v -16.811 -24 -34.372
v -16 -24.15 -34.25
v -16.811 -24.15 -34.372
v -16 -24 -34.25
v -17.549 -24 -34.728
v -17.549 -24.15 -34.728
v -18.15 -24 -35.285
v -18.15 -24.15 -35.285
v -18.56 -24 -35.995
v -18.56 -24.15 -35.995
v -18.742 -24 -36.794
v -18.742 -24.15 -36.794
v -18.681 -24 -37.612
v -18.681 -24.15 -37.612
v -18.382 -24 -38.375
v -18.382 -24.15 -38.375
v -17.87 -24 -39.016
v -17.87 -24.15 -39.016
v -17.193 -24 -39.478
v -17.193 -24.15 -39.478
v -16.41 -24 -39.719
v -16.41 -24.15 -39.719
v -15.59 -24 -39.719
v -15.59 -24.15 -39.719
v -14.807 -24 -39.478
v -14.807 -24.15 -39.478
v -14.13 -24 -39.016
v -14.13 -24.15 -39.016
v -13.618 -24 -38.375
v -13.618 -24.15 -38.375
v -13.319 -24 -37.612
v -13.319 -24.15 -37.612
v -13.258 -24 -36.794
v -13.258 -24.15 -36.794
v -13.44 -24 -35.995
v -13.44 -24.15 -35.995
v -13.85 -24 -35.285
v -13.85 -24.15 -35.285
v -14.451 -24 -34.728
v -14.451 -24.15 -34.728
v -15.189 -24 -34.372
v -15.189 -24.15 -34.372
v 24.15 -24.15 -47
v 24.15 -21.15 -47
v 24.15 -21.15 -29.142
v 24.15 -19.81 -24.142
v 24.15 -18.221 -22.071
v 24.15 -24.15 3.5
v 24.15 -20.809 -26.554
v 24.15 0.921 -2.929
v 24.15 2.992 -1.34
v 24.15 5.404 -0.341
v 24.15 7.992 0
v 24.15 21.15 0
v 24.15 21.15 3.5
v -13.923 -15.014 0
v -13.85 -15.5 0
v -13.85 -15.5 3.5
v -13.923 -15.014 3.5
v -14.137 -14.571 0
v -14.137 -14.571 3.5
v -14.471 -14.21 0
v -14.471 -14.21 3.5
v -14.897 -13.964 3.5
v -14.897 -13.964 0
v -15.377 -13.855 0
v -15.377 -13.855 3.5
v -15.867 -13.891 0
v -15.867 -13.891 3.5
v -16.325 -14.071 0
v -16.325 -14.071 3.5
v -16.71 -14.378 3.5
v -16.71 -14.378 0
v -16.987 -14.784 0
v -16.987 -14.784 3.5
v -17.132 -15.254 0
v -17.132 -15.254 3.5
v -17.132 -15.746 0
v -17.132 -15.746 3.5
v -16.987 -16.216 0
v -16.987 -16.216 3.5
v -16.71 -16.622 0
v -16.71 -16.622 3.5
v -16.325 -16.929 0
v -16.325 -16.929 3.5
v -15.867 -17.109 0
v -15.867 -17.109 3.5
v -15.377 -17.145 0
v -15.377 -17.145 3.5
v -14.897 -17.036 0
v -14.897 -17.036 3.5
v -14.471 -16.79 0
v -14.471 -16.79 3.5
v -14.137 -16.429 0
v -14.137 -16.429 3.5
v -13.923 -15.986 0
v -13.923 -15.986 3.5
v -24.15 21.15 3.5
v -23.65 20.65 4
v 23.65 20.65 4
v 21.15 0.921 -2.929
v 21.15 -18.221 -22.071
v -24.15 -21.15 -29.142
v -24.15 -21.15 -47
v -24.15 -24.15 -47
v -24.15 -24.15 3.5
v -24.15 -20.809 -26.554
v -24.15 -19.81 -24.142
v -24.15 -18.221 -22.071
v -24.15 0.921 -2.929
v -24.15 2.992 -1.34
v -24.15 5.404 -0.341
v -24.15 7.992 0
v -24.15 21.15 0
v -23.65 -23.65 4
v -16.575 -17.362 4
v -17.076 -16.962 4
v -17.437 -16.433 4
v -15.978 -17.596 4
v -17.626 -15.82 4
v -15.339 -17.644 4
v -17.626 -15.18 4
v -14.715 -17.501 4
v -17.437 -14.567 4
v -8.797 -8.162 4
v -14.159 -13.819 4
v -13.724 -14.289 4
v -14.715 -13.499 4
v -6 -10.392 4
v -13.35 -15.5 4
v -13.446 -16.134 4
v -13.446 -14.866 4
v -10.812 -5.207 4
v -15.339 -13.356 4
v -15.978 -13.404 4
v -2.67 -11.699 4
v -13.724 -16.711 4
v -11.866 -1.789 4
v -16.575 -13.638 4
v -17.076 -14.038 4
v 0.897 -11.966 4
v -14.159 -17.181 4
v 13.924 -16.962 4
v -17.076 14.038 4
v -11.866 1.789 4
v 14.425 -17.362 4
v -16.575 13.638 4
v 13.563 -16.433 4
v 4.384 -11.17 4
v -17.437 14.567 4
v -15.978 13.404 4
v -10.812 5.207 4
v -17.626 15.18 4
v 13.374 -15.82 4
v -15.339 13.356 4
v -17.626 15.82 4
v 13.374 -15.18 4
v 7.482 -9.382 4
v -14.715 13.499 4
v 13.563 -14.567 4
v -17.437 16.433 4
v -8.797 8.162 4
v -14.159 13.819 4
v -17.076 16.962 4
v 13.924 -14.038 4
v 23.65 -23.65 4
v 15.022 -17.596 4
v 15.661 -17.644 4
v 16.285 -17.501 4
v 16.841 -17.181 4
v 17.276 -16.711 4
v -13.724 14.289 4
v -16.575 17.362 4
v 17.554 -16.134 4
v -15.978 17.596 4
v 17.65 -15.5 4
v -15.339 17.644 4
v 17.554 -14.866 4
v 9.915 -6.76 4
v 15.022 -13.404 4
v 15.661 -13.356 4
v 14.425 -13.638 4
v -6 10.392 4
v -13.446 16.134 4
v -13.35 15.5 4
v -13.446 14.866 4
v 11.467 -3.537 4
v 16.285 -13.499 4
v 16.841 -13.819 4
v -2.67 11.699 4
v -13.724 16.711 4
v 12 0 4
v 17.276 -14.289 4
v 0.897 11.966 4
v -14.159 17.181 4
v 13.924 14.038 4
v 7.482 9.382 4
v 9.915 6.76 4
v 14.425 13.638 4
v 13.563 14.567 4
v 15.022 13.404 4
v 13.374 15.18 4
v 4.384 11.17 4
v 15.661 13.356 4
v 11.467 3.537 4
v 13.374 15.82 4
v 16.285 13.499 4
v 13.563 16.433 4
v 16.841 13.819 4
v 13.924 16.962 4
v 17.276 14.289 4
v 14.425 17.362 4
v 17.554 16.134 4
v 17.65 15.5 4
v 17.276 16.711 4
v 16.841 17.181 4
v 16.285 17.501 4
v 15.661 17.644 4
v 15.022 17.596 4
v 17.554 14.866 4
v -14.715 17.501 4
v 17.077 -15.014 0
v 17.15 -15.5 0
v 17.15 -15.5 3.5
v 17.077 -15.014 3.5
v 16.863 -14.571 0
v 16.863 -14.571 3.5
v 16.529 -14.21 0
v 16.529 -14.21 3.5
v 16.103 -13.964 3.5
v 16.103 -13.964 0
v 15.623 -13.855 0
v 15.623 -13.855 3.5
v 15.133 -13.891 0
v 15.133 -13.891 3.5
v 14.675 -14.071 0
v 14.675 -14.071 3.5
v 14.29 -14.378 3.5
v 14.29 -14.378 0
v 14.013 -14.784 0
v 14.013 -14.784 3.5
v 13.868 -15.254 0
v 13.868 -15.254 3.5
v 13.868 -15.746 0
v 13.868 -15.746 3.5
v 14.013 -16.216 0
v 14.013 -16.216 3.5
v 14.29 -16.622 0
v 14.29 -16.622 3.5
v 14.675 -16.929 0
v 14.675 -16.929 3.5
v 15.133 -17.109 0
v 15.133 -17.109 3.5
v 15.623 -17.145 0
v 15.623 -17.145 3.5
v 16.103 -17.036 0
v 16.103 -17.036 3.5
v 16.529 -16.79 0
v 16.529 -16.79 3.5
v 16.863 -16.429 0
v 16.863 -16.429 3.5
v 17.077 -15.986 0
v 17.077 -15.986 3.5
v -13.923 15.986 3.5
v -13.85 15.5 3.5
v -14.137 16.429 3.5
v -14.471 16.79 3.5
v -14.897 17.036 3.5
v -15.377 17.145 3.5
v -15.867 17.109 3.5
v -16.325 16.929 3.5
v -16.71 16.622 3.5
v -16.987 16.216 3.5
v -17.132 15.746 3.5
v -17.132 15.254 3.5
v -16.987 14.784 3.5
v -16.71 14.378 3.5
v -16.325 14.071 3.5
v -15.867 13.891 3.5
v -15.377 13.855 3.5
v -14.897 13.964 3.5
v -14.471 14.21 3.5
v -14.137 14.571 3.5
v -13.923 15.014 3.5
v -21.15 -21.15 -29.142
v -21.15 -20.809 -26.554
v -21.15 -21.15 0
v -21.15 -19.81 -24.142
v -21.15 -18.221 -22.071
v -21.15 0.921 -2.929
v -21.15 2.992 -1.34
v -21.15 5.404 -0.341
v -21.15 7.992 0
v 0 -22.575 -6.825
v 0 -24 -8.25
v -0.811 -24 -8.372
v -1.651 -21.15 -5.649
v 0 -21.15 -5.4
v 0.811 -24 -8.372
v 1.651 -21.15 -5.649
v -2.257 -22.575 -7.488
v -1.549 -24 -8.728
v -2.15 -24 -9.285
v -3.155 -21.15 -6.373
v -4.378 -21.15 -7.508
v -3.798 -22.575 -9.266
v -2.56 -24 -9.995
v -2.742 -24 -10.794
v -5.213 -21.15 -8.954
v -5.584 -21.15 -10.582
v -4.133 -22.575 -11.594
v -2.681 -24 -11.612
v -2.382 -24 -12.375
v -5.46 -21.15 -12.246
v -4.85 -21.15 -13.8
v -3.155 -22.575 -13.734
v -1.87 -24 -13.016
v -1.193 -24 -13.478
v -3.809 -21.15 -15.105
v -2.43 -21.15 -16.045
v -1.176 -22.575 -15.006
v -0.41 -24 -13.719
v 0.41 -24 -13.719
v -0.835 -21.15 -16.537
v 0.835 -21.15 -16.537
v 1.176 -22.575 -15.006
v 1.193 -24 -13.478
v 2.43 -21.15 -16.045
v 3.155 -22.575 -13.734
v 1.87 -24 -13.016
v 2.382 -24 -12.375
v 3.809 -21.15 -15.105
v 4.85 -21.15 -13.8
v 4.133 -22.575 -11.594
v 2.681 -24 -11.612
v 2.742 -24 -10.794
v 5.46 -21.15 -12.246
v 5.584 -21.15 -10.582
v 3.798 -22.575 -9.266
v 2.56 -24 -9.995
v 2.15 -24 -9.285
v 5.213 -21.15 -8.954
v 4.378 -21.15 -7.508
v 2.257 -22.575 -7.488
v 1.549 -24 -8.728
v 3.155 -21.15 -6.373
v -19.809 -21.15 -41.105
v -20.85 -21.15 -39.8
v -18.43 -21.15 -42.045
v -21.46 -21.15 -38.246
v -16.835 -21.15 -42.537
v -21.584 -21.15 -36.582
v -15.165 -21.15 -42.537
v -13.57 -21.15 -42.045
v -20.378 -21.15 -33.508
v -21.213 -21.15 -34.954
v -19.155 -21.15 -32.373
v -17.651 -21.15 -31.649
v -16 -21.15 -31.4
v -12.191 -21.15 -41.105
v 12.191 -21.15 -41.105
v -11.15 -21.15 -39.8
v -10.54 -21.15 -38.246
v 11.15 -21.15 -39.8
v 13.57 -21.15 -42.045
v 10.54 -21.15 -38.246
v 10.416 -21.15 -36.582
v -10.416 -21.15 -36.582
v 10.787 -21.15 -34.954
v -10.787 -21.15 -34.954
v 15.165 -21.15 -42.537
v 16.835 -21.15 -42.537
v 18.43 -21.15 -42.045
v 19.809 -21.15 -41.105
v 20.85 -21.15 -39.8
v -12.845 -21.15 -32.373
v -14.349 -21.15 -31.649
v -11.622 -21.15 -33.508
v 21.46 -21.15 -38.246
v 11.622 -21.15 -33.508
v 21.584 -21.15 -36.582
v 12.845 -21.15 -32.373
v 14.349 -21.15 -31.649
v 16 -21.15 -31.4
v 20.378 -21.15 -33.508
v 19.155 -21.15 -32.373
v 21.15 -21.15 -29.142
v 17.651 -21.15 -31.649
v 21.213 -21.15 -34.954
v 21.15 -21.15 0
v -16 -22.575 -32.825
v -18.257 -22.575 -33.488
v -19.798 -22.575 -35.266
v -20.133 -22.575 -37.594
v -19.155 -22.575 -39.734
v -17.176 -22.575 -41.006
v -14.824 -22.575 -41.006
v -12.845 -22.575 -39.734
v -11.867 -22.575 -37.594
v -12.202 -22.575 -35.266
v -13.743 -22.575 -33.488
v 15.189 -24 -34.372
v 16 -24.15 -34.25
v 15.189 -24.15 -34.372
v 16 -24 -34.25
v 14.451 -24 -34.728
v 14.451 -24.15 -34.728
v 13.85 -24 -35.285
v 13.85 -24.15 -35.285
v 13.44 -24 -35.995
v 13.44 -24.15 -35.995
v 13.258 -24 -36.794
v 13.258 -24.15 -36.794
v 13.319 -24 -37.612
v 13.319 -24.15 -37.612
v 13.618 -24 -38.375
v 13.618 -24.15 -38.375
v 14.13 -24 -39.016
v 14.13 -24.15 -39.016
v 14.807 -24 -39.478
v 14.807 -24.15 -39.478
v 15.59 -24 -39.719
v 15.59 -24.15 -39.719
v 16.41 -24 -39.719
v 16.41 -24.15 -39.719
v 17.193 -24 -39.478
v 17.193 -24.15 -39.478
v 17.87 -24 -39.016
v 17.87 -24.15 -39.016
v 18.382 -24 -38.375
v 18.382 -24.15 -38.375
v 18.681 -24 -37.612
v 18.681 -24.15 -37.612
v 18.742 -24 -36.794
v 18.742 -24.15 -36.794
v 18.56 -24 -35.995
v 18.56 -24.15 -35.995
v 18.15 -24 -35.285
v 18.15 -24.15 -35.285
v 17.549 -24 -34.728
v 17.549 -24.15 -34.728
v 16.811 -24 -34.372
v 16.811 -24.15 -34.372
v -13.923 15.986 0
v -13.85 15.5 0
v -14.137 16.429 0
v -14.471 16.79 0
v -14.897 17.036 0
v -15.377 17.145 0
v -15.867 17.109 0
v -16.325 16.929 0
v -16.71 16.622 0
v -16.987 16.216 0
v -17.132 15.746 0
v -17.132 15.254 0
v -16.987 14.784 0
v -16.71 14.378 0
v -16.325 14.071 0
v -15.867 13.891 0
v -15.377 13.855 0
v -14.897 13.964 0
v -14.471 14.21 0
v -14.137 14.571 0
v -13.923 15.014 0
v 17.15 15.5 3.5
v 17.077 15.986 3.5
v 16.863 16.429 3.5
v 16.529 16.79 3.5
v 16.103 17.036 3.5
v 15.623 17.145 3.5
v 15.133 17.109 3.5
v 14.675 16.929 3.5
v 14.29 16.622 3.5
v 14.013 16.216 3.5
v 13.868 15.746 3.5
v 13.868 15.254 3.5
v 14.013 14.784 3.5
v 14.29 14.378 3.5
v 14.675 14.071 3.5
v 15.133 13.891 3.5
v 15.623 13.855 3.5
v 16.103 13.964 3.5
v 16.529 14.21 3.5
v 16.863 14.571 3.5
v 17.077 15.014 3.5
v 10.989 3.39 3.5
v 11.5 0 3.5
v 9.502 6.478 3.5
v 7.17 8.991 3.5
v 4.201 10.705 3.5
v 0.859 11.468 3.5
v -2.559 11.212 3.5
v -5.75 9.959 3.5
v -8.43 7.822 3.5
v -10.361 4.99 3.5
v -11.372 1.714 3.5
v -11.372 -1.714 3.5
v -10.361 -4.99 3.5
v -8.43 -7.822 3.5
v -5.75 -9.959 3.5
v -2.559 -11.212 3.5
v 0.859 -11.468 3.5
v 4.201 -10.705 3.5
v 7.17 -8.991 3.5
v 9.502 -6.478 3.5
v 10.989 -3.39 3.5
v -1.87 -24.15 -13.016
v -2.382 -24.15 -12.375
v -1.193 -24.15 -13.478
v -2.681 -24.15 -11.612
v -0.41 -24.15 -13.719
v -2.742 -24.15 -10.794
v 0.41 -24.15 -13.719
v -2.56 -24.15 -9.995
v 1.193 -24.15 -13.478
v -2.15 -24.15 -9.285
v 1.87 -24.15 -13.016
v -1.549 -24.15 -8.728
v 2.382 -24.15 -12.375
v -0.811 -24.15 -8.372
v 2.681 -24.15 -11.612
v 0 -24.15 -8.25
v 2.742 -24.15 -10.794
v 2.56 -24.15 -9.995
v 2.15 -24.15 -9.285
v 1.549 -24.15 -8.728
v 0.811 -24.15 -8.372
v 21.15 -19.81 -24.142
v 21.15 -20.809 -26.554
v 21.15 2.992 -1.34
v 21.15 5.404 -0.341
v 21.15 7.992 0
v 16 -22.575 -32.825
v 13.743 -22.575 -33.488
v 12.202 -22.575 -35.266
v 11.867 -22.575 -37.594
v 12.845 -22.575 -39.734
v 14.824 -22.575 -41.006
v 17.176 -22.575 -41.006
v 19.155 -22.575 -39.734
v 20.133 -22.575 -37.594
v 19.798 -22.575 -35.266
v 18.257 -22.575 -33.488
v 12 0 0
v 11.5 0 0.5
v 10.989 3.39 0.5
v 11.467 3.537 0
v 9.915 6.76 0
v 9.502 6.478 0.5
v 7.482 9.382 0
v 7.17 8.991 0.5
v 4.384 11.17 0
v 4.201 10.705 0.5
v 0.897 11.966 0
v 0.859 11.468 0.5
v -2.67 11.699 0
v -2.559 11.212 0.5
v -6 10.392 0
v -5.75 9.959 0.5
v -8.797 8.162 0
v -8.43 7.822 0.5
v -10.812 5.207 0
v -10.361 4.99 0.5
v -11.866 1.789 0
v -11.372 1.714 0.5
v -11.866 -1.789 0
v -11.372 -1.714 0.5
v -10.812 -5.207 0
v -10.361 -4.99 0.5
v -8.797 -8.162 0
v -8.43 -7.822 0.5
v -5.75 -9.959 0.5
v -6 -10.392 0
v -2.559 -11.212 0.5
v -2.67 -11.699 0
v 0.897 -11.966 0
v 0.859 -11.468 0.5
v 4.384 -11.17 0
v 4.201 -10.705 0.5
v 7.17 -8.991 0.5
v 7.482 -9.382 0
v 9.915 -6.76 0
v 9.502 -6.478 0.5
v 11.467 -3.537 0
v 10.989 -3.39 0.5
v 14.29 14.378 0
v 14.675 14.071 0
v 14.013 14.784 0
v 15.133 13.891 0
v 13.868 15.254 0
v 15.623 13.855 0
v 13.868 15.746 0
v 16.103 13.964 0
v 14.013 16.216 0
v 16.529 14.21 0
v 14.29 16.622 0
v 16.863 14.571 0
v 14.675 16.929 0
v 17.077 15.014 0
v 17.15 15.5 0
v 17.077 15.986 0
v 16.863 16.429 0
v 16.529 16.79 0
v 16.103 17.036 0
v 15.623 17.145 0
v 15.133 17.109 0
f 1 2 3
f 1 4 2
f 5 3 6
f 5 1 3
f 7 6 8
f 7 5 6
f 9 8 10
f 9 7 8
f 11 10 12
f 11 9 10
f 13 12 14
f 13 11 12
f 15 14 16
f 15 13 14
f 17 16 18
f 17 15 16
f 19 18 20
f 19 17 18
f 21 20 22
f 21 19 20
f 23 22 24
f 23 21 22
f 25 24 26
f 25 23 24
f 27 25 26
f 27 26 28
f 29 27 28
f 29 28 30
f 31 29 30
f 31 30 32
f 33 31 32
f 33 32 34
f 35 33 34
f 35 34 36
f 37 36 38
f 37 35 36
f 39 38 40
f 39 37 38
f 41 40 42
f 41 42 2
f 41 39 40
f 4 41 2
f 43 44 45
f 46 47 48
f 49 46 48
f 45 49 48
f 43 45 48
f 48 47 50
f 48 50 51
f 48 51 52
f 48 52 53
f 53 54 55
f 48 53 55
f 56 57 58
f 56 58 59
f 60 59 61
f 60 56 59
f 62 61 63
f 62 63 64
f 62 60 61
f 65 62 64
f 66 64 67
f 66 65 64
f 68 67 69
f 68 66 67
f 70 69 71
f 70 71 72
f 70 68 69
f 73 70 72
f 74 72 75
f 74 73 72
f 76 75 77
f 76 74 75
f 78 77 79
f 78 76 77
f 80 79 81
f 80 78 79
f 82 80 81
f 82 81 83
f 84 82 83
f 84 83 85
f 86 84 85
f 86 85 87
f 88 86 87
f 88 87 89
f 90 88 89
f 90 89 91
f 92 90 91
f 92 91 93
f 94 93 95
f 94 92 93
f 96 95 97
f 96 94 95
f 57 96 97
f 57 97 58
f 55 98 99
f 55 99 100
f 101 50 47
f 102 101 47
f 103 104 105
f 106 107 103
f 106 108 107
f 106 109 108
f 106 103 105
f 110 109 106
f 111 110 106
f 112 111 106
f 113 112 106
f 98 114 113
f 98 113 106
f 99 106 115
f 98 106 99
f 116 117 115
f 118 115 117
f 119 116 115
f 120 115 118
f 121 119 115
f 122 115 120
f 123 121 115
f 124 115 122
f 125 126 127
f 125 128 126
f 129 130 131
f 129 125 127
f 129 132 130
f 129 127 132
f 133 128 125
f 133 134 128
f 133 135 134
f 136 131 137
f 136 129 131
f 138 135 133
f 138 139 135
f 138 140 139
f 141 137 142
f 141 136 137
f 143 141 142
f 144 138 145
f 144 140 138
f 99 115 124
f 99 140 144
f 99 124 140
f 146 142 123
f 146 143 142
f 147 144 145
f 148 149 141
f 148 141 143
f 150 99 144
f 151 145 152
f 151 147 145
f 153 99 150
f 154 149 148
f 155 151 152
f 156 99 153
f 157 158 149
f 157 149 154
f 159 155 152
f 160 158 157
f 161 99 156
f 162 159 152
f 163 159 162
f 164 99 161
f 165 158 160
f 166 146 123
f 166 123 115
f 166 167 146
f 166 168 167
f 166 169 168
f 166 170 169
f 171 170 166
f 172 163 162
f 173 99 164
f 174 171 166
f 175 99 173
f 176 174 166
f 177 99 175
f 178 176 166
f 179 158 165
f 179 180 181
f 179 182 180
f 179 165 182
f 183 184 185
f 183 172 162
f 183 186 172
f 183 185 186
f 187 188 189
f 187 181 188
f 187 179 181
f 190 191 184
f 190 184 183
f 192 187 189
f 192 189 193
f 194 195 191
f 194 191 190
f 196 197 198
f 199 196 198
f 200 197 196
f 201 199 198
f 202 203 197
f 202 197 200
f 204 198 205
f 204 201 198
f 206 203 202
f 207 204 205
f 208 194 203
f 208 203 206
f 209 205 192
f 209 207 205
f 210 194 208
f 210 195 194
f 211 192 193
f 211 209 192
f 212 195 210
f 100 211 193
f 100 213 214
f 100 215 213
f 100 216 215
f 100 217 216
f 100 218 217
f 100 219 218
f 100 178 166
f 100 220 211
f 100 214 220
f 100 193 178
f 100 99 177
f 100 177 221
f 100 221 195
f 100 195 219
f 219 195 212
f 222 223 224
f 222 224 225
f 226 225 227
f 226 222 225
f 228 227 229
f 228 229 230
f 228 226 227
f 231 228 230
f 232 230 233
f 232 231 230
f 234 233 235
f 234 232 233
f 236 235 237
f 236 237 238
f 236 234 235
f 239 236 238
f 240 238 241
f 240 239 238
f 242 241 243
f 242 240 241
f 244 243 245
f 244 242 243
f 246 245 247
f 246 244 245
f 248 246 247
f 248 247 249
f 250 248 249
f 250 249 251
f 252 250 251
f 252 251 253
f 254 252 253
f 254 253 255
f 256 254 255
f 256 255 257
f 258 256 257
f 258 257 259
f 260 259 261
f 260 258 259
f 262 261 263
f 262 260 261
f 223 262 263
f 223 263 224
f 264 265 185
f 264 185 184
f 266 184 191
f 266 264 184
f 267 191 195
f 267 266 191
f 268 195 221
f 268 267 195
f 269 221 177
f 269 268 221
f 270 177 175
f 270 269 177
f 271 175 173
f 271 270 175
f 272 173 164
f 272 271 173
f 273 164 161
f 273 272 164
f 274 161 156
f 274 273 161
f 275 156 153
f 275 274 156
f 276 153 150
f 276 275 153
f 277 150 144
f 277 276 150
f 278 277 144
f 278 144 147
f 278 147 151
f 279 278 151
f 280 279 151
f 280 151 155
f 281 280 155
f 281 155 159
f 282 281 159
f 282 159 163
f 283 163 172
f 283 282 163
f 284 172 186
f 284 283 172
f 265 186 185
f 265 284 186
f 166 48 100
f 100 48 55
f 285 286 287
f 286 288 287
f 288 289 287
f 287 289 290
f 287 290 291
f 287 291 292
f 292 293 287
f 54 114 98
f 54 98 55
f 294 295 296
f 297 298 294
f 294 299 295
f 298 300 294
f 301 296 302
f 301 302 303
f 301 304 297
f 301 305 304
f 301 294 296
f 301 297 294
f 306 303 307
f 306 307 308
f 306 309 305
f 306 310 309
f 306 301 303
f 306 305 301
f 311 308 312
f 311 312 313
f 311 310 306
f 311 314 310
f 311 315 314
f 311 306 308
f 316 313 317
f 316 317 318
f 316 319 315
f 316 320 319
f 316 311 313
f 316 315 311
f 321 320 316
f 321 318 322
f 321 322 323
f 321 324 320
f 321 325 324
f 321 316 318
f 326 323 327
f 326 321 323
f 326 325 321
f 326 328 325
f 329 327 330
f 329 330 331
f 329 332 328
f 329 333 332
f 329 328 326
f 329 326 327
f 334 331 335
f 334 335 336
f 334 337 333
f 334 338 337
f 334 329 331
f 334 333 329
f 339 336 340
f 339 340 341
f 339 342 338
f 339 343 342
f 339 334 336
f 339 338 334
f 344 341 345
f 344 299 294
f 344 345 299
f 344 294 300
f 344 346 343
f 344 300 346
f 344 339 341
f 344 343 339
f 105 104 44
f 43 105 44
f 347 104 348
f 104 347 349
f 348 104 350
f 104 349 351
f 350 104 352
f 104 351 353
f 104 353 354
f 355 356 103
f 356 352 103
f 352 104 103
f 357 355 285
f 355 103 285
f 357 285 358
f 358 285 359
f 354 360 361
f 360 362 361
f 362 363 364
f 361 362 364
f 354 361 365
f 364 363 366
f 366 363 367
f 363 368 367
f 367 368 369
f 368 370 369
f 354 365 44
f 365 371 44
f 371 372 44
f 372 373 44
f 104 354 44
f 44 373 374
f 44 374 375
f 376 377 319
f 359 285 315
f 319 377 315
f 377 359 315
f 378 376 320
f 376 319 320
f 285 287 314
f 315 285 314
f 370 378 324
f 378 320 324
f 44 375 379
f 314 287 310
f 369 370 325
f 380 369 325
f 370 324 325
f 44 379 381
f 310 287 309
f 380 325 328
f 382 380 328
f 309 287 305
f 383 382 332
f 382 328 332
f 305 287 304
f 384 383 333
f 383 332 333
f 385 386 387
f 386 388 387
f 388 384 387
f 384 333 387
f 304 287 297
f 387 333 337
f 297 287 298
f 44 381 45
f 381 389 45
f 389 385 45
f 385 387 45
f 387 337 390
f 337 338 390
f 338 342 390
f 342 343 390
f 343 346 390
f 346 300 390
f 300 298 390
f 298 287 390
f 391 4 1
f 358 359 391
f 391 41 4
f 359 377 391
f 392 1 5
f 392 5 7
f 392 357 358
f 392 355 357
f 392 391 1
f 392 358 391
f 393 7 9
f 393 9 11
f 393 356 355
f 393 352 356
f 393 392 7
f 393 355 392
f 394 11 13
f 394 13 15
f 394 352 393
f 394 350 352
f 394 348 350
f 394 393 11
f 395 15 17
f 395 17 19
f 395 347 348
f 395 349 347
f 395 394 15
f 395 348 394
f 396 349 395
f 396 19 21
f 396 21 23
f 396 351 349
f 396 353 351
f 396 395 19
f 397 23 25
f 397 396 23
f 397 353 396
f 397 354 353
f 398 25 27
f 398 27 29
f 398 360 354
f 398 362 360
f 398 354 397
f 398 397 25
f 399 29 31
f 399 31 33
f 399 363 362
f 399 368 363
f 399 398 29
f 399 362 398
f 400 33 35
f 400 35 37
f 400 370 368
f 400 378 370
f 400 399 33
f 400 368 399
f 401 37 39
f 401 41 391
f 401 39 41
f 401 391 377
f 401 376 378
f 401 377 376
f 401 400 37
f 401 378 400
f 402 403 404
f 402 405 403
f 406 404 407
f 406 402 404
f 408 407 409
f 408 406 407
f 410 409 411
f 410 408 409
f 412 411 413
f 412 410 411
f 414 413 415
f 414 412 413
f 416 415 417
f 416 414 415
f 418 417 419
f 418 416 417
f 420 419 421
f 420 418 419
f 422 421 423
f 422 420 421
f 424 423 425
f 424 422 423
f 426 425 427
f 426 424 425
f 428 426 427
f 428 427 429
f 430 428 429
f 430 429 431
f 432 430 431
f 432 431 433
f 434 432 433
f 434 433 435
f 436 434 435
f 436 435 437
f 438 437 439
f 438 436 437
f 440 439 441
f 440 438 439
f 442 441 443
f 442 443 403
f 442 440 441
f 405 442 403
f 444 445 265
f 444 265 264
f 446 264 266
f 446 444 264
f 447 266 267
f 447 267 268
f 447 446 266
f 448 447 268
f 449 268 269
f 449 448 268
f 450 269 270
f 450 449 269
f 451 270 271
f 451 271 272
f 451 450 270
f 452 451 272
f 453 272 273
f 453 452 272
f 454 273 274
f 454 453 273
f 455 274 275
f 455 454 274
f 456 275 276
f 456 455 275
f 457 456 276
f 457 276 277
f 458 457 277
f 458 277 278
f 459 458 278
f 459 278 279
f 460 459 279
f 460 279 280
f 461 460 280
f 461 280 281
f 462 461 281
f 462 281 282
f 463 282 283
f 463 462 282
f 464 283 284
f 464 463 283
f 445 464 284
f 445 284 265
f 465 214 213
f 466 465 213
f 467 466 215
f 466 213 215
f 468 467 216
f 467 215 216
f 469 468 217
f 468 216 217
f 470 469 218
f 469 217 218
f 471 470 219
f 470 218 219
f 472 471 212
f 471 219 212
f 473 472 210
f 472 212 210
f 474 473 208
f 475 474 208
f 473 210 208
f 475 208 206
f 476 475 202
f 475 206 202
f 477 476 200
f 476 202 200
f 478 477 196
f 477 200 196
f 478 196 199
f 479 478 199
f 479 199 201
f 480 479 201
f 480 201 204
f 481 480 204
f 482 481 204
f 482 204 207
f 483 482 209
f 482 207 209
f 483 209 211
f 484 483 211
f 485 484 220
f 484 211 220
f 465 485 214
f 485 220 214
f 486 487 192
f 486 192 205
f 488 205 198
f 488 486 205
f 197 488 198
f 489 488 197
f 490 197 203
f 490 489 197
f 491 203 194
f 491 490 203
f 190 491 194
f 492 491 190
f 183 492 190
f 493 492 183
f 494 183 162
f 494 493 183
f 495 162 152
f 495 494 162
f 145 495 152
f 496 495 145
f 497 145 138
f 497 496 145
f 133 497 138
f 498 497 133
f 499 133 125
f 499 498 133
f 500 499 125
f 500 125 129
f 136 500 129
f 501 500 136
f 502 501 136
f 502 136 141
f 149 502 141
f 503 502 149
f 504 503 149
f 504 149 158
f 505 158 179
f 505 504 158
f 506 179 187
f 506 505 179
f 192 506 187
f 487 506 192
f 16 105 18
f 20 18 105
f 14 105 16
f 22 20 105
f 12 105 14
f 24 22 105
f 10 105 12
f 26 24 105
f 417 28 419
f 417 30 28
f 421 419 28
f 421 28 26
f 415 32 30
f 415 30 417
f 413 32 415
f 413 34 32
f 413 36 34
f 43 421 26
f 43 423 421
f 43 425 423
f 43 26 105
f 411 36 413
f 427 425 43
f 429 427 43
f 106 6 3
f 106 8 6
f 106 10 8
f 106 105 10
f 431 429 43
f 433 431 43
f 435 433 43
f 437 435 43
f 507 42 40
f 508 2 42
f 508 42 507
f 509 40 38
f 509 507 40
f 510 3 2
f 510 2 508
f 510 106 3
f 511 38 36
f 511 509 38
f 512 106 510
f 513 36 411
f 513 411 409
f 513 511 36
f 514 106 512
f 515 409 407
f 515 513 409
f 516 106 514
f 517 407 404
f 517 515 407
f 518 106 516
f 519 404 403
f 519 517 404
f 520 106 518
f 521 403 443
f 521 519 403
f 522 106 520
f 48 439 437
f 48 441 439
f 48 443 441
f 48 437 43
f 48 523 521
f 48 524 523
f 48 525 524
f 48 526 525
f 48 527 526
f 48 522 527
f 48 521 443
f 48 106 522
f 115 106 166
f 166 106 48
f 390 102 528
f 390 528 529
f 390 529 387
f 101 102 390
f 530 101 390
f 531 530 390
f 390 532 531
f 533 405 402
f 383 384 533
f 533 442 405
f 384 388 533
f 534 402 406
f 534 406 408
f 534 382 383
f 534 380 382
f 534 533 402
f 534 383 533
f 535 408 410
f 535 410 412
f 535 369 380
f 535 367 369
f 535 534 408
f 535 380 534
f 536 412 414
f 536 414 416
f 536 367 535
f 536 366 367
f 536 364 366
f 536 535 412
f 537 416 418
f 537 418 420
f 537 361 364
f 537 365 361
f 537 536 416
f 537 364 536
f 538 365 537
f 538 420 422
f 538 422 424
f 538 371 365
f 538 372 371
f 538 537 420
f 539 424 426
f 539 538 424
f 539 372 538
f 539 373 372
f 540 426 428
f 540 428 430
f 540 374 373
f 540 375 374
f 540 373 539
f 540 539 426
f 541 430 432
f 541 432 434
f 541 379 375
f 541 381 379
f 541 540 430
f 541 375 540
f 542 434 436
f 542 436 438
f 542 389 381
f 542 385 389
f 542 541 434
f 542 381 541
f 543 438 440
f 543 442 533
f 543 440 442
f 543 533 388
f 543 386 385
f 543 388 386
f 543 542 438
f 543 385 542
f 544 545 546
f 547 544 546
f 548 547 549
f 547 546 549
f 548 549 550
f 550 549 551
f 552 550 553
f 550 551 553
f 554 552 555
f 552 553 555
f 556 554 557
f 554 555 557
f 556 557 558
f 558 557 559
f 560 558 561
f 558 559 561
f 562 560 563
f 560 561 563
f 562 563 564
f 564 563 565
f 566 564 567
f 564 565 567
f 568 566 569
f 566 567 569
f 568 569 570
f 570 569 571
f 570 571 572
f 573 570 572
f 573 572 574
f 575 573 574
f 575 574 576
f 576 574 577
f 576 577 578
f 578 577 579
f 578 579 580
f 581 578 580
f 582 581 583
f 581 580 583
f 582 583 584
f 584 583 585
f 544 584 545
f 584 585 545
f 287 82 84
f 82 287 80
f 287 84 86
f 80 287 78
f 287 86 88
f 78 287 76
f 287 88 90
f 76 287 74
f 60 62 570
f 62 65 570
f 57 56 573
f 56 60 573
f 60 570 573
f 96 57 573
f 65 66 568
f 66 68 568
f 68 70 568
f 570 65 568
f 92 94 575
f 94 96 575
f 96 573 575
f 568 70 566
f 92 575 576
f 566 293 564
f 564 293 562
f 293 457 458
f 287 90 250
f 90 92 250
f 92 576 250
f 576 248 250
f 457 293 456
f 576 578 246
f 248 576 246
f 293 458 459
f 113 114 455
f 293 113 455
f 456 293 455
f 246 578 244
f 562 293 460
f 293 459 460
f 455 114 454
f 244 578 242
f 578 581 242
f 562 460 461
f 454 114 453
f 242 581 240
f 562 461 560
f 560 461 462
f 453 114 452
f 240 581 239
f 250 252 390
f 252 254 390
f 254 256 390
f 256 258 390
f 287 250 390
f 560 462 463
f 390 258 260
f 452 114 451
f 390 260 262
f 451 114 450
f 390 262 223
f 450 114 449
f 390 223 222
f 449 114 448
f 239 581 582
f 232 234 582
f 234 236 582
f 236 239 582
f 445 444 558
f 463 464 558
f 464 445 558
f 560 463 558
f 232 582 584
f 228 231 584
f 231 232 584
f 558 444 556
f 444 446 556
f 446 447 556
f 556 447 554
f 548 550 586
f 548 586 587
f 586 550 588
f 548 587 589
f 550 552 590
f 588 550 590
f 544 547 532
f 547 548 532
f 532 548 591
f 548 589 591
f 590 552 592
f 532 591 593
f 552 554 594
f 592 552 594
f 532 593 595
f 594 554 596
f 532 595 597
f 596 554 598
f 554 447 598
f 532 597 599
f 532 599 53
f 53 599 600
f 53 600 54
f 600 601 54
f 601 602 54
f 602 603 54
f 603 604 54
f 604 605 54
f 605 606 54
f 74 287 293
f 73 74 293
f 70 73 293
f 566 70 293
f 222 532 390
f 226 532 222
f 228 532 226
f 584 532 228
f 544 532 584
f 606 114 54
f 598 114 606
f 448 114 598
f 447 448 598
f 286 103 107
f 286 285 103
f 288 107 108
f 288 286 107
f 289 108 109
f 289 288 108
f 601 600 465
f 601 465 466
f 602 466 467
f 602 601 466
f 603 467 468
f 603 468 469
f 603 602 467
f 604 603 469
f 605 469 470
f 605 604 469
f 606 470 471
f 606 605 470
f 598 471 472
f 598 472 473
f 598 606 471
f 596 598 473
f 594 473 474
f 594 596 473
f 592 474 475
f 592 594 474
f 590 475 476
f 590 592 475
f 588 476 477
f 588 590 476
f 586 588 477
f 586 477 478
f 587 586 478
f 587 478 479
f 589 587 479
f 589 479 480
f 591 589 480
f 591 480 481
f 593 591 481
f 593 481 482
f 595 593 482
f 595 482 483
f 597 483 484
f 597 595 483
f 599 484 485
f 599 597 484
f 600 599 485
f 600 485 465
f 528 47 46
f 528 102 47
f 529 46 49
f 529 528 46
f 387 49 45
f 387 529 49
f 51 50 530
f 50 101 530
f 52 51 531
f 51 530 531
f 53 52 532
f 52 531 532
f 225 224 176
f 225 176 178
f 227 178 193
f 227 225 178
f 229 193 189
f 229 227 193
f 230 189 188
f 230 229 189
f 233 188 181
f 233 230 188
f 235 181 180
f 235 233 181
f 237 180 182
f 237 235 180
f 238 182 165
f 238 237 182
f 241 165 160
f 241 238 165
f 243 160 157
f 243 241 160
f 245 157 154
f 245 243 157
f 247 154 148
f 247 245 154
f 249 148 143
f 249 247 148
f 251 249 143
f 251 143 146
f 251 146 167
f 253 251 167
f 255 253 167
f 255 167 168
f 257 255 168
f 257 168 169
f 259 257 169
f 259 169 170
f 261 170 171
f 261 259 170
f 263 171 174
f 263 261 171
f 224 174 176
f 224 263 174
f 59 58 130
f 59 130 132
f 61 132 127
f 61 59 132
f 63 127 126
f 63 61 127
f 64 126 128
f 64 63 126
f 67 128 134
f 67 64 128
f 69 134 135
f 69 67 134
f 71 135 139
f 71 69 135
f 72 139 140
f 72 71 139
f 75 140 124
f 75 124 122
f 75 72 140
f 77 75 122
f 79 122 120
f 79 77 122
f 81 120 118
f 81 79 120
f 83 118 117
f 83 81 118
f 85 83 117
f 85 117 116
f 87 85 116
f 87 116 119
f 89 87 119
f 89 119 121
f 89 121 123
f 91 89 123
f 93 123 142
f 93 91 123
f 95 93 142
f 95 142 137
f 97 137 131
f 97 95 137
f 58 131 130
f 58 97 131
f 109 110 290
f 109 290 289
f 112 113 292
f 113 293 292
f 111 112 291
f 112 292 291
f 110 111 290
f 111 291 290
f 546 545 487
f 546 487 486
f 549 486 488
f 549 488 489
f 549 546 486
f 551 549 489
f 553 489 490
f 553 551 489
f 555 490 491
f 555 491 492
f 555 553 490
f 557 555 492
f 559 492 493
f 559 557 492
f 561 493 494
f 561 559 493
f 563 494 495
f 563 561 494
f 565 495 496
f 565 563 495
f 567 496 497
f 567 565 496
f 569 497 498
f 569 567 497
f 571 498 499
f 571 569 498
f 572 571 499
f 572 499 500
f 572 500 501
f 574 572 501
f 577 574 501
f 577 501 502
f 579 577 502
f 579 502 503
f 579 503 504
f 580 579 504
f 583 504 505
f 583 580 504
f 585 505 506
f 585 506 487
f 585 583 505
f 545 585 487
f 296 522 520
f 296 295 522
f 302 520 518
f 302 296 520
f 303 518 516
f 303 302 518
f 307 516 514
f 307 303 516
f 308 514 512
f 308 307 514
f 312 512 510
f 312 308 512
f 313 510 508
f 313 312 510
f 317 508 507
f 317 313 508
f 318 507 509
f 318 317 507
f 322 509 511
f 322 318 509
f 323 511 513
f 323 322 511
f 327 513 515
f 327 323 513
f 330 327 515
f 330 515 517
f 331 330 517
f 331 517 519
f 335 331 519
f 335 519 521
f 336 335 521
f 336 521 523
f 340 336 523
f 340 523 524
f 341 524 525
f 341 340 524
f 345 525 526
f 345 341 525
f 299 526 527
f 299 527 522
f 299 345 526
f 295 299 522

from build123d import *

# Parameters (mm, degrees)
ESQUISSE1_W                                = 48.3
ESQUISSE1_H                                = 42.3
ESQUISSE1_R                                = 11.5
ESQUISSE1_R_2                              = 1.65
BOSS_EXTRU_1_DEPTH                         = 4
ESQUISSE2_W                                = 48.3
ESQUISSE2_H                                = 51
BOSS_EXTRU_2_DEPTH                         = 3
BOSS_EXTRU_3_DEPTH                         = 3
CONG_1_R                                   = 10
CHANFREIN1_SIZE                            = 0.5
CHANFREIN2_SIZE                            = 0.5
FRAISAGE_POUR_VIS_T_TE_FRAIS_E_BOM_2_COUNT = 2
FRAISAGE_POUR_VIS_T_TE_FRAIS_E_BOM_2_PITCH = 30.528675045
FRAISAGE_POUR_VIS_T_TE_FRAIS_E_BOM_3_COUNT = 2
FRAISAGE_POUR_VIS_T_TE_FRAIS_E_BOM_3_PITCH = 30.528675045


with BuildPart() as part:
    # Esquisse1 → Boss.-Extru.1 (new body)
    with BuildSketch(Plane.XY):
        Rectangle(ESQUISSE1_W, ESQUISSE1_H)
        Circle(ESQUISSE1_R, mode=Mode.SUBTRACT)
        with Locations((-15.5, 15.5)):
            Circle(ESQUISSE1_R_2, mode=Mode.SUBTRACT)
        with Locations((15.5, 15.5)):
            Circle(ESQUISSE1_R_2, mode=Mode.SUBTRACT)
        with Locations((15.5, -15.5)):
            Circle(ESQUISSE1_R_2, mode=Mode.SUBTRACT)
        with Locations((-15.5, -15.5)):
            Circle(ESQUISSE1_R_2, mode=Mode.SUBTRACT)
    extrude(amount=BOSS_EXTRU_1_DEPTH)

    # Esquisse2 → Boss.-Extru.2 (add)
    with BuildSketch(Plane.XZ.offset(21.15)):
        with Locations((0, -21.5)):
            Rectangle(ESQUISSE2_W, ESQUISSE2_H)
    extrude(amount=BOSS_EXTRU_2_DEPTH)

    # Esquisse3 → Boss.-Extru.3 (add)
    with BuildSketch(Plane.ZY.offset(24.15)):
        Polygon((0, 3.85), (-25, -21.15), (0, -21.15), align=None)
    boss_extru_3 = extrude(amount=-BOSS_EXTRU_3_DEPTH)

    # Symétrie1: Boss.-Extru.3 across plane
    add(boss_extru_3.mirror(Plane(origin=(0, 0, 0), x_dir=(0, 0, 1), z_dir=(1, 0, 0))))

    # Congé1
    cong_1_edges = [part.edges().sort_by_distance(p)[0] for p in [
        (-22.65, 3.85, 0),
        (-22.65, -21.15, -25),
        (22.65, 3.85, 0),
        (22.65, -21.15, -25),
    ]]
    fillet(cong_1_edges, radius=CONG_1_R)

    # Chanfrein1
    chanfrein1_edges = [part.edges().sort_by_distance(p)[0] for p in [
        (-11.5, 0, 4),
        (24.15, -1.5, 4),
        (-17.15, 15.5, 4),
        (0, 21.15, 4),
        (13.85, 15.5, 4),
        (13.85, -15.5, 4),
        (-17.15, -15.5, 4),
        (0, -24.15, 4),
        (-24.15, -1.5, 4),
    ]]
    chamfer(chanfrein1_edges, length=CHANFREIN1_SIZE)

    # Chanfrein2
    chanfrein2_edges = [part.edges().sort_by_distance(p)[0] for p in [
        (-11.5, 0, 0),
    ]]
    chamfer(chanfrein2_edges, length=CHANFREIN2_SIZE)

    # Esquisse4 → Fraisage pour vis à tête fraisée bombée fendue M51 (revolve, cut)
    with BuildSketch(Plane(origin=(0, -21.15, -11), x_dir=(0, 0, 1), z_dir=(1, 0, 0))):
        Polygon((0, 0), (0, 3), (2.75, 3), (2.75, 2.85), (5.6, 0), align=None)
    fraisage_pour_vis_t_te_frais_e_bomb_e = revolve(axis=Axis((0, -14.8, -11), (0, -1, 0)), mode=Mode.SUBTRACT)

    # Fraisage pour vis _ t_te frais_e bom 2: Fraisage pour vis à tête fraisée bombée fendue M51 ×2
    with Locations(*[Vector(0.5240974256643348, 0, -0.8516583167045438) * (i * FRAISAGE_POUR_VIS_T_TE_FRAIS_E_BOM_2_PITCH) for i in range(1, FRAISAGE_POUR_VIS_T_TE_FRAIS_E_BOM_2_COUNT)]):
        add(fraisage_pour_vis_t_te_frais_e_bomb_e, mode=Mode.SUBTRACT)

    # Fraisage pour vis _ t_te frais_e bom 3: Fraisage pour vis à tête fraisée bombée fendue M51 ×2
    with Locations(*[Vector(-0.5240974256643347, 0, -0.851658316704544) * (i * FRAISAGE_POUR_VIS_T_TE_FRAIS_E_BOM_3_PITCH) for i in range(1, FRAISAGE_POUR_VIS_T_TE_FRAIS_E_BOM_3_COUNT)]):
        add(fraisage_pour_vis_t_te_frais_e_bomb_e, mode=Mode.SUBTRACT)


solid = part.part
